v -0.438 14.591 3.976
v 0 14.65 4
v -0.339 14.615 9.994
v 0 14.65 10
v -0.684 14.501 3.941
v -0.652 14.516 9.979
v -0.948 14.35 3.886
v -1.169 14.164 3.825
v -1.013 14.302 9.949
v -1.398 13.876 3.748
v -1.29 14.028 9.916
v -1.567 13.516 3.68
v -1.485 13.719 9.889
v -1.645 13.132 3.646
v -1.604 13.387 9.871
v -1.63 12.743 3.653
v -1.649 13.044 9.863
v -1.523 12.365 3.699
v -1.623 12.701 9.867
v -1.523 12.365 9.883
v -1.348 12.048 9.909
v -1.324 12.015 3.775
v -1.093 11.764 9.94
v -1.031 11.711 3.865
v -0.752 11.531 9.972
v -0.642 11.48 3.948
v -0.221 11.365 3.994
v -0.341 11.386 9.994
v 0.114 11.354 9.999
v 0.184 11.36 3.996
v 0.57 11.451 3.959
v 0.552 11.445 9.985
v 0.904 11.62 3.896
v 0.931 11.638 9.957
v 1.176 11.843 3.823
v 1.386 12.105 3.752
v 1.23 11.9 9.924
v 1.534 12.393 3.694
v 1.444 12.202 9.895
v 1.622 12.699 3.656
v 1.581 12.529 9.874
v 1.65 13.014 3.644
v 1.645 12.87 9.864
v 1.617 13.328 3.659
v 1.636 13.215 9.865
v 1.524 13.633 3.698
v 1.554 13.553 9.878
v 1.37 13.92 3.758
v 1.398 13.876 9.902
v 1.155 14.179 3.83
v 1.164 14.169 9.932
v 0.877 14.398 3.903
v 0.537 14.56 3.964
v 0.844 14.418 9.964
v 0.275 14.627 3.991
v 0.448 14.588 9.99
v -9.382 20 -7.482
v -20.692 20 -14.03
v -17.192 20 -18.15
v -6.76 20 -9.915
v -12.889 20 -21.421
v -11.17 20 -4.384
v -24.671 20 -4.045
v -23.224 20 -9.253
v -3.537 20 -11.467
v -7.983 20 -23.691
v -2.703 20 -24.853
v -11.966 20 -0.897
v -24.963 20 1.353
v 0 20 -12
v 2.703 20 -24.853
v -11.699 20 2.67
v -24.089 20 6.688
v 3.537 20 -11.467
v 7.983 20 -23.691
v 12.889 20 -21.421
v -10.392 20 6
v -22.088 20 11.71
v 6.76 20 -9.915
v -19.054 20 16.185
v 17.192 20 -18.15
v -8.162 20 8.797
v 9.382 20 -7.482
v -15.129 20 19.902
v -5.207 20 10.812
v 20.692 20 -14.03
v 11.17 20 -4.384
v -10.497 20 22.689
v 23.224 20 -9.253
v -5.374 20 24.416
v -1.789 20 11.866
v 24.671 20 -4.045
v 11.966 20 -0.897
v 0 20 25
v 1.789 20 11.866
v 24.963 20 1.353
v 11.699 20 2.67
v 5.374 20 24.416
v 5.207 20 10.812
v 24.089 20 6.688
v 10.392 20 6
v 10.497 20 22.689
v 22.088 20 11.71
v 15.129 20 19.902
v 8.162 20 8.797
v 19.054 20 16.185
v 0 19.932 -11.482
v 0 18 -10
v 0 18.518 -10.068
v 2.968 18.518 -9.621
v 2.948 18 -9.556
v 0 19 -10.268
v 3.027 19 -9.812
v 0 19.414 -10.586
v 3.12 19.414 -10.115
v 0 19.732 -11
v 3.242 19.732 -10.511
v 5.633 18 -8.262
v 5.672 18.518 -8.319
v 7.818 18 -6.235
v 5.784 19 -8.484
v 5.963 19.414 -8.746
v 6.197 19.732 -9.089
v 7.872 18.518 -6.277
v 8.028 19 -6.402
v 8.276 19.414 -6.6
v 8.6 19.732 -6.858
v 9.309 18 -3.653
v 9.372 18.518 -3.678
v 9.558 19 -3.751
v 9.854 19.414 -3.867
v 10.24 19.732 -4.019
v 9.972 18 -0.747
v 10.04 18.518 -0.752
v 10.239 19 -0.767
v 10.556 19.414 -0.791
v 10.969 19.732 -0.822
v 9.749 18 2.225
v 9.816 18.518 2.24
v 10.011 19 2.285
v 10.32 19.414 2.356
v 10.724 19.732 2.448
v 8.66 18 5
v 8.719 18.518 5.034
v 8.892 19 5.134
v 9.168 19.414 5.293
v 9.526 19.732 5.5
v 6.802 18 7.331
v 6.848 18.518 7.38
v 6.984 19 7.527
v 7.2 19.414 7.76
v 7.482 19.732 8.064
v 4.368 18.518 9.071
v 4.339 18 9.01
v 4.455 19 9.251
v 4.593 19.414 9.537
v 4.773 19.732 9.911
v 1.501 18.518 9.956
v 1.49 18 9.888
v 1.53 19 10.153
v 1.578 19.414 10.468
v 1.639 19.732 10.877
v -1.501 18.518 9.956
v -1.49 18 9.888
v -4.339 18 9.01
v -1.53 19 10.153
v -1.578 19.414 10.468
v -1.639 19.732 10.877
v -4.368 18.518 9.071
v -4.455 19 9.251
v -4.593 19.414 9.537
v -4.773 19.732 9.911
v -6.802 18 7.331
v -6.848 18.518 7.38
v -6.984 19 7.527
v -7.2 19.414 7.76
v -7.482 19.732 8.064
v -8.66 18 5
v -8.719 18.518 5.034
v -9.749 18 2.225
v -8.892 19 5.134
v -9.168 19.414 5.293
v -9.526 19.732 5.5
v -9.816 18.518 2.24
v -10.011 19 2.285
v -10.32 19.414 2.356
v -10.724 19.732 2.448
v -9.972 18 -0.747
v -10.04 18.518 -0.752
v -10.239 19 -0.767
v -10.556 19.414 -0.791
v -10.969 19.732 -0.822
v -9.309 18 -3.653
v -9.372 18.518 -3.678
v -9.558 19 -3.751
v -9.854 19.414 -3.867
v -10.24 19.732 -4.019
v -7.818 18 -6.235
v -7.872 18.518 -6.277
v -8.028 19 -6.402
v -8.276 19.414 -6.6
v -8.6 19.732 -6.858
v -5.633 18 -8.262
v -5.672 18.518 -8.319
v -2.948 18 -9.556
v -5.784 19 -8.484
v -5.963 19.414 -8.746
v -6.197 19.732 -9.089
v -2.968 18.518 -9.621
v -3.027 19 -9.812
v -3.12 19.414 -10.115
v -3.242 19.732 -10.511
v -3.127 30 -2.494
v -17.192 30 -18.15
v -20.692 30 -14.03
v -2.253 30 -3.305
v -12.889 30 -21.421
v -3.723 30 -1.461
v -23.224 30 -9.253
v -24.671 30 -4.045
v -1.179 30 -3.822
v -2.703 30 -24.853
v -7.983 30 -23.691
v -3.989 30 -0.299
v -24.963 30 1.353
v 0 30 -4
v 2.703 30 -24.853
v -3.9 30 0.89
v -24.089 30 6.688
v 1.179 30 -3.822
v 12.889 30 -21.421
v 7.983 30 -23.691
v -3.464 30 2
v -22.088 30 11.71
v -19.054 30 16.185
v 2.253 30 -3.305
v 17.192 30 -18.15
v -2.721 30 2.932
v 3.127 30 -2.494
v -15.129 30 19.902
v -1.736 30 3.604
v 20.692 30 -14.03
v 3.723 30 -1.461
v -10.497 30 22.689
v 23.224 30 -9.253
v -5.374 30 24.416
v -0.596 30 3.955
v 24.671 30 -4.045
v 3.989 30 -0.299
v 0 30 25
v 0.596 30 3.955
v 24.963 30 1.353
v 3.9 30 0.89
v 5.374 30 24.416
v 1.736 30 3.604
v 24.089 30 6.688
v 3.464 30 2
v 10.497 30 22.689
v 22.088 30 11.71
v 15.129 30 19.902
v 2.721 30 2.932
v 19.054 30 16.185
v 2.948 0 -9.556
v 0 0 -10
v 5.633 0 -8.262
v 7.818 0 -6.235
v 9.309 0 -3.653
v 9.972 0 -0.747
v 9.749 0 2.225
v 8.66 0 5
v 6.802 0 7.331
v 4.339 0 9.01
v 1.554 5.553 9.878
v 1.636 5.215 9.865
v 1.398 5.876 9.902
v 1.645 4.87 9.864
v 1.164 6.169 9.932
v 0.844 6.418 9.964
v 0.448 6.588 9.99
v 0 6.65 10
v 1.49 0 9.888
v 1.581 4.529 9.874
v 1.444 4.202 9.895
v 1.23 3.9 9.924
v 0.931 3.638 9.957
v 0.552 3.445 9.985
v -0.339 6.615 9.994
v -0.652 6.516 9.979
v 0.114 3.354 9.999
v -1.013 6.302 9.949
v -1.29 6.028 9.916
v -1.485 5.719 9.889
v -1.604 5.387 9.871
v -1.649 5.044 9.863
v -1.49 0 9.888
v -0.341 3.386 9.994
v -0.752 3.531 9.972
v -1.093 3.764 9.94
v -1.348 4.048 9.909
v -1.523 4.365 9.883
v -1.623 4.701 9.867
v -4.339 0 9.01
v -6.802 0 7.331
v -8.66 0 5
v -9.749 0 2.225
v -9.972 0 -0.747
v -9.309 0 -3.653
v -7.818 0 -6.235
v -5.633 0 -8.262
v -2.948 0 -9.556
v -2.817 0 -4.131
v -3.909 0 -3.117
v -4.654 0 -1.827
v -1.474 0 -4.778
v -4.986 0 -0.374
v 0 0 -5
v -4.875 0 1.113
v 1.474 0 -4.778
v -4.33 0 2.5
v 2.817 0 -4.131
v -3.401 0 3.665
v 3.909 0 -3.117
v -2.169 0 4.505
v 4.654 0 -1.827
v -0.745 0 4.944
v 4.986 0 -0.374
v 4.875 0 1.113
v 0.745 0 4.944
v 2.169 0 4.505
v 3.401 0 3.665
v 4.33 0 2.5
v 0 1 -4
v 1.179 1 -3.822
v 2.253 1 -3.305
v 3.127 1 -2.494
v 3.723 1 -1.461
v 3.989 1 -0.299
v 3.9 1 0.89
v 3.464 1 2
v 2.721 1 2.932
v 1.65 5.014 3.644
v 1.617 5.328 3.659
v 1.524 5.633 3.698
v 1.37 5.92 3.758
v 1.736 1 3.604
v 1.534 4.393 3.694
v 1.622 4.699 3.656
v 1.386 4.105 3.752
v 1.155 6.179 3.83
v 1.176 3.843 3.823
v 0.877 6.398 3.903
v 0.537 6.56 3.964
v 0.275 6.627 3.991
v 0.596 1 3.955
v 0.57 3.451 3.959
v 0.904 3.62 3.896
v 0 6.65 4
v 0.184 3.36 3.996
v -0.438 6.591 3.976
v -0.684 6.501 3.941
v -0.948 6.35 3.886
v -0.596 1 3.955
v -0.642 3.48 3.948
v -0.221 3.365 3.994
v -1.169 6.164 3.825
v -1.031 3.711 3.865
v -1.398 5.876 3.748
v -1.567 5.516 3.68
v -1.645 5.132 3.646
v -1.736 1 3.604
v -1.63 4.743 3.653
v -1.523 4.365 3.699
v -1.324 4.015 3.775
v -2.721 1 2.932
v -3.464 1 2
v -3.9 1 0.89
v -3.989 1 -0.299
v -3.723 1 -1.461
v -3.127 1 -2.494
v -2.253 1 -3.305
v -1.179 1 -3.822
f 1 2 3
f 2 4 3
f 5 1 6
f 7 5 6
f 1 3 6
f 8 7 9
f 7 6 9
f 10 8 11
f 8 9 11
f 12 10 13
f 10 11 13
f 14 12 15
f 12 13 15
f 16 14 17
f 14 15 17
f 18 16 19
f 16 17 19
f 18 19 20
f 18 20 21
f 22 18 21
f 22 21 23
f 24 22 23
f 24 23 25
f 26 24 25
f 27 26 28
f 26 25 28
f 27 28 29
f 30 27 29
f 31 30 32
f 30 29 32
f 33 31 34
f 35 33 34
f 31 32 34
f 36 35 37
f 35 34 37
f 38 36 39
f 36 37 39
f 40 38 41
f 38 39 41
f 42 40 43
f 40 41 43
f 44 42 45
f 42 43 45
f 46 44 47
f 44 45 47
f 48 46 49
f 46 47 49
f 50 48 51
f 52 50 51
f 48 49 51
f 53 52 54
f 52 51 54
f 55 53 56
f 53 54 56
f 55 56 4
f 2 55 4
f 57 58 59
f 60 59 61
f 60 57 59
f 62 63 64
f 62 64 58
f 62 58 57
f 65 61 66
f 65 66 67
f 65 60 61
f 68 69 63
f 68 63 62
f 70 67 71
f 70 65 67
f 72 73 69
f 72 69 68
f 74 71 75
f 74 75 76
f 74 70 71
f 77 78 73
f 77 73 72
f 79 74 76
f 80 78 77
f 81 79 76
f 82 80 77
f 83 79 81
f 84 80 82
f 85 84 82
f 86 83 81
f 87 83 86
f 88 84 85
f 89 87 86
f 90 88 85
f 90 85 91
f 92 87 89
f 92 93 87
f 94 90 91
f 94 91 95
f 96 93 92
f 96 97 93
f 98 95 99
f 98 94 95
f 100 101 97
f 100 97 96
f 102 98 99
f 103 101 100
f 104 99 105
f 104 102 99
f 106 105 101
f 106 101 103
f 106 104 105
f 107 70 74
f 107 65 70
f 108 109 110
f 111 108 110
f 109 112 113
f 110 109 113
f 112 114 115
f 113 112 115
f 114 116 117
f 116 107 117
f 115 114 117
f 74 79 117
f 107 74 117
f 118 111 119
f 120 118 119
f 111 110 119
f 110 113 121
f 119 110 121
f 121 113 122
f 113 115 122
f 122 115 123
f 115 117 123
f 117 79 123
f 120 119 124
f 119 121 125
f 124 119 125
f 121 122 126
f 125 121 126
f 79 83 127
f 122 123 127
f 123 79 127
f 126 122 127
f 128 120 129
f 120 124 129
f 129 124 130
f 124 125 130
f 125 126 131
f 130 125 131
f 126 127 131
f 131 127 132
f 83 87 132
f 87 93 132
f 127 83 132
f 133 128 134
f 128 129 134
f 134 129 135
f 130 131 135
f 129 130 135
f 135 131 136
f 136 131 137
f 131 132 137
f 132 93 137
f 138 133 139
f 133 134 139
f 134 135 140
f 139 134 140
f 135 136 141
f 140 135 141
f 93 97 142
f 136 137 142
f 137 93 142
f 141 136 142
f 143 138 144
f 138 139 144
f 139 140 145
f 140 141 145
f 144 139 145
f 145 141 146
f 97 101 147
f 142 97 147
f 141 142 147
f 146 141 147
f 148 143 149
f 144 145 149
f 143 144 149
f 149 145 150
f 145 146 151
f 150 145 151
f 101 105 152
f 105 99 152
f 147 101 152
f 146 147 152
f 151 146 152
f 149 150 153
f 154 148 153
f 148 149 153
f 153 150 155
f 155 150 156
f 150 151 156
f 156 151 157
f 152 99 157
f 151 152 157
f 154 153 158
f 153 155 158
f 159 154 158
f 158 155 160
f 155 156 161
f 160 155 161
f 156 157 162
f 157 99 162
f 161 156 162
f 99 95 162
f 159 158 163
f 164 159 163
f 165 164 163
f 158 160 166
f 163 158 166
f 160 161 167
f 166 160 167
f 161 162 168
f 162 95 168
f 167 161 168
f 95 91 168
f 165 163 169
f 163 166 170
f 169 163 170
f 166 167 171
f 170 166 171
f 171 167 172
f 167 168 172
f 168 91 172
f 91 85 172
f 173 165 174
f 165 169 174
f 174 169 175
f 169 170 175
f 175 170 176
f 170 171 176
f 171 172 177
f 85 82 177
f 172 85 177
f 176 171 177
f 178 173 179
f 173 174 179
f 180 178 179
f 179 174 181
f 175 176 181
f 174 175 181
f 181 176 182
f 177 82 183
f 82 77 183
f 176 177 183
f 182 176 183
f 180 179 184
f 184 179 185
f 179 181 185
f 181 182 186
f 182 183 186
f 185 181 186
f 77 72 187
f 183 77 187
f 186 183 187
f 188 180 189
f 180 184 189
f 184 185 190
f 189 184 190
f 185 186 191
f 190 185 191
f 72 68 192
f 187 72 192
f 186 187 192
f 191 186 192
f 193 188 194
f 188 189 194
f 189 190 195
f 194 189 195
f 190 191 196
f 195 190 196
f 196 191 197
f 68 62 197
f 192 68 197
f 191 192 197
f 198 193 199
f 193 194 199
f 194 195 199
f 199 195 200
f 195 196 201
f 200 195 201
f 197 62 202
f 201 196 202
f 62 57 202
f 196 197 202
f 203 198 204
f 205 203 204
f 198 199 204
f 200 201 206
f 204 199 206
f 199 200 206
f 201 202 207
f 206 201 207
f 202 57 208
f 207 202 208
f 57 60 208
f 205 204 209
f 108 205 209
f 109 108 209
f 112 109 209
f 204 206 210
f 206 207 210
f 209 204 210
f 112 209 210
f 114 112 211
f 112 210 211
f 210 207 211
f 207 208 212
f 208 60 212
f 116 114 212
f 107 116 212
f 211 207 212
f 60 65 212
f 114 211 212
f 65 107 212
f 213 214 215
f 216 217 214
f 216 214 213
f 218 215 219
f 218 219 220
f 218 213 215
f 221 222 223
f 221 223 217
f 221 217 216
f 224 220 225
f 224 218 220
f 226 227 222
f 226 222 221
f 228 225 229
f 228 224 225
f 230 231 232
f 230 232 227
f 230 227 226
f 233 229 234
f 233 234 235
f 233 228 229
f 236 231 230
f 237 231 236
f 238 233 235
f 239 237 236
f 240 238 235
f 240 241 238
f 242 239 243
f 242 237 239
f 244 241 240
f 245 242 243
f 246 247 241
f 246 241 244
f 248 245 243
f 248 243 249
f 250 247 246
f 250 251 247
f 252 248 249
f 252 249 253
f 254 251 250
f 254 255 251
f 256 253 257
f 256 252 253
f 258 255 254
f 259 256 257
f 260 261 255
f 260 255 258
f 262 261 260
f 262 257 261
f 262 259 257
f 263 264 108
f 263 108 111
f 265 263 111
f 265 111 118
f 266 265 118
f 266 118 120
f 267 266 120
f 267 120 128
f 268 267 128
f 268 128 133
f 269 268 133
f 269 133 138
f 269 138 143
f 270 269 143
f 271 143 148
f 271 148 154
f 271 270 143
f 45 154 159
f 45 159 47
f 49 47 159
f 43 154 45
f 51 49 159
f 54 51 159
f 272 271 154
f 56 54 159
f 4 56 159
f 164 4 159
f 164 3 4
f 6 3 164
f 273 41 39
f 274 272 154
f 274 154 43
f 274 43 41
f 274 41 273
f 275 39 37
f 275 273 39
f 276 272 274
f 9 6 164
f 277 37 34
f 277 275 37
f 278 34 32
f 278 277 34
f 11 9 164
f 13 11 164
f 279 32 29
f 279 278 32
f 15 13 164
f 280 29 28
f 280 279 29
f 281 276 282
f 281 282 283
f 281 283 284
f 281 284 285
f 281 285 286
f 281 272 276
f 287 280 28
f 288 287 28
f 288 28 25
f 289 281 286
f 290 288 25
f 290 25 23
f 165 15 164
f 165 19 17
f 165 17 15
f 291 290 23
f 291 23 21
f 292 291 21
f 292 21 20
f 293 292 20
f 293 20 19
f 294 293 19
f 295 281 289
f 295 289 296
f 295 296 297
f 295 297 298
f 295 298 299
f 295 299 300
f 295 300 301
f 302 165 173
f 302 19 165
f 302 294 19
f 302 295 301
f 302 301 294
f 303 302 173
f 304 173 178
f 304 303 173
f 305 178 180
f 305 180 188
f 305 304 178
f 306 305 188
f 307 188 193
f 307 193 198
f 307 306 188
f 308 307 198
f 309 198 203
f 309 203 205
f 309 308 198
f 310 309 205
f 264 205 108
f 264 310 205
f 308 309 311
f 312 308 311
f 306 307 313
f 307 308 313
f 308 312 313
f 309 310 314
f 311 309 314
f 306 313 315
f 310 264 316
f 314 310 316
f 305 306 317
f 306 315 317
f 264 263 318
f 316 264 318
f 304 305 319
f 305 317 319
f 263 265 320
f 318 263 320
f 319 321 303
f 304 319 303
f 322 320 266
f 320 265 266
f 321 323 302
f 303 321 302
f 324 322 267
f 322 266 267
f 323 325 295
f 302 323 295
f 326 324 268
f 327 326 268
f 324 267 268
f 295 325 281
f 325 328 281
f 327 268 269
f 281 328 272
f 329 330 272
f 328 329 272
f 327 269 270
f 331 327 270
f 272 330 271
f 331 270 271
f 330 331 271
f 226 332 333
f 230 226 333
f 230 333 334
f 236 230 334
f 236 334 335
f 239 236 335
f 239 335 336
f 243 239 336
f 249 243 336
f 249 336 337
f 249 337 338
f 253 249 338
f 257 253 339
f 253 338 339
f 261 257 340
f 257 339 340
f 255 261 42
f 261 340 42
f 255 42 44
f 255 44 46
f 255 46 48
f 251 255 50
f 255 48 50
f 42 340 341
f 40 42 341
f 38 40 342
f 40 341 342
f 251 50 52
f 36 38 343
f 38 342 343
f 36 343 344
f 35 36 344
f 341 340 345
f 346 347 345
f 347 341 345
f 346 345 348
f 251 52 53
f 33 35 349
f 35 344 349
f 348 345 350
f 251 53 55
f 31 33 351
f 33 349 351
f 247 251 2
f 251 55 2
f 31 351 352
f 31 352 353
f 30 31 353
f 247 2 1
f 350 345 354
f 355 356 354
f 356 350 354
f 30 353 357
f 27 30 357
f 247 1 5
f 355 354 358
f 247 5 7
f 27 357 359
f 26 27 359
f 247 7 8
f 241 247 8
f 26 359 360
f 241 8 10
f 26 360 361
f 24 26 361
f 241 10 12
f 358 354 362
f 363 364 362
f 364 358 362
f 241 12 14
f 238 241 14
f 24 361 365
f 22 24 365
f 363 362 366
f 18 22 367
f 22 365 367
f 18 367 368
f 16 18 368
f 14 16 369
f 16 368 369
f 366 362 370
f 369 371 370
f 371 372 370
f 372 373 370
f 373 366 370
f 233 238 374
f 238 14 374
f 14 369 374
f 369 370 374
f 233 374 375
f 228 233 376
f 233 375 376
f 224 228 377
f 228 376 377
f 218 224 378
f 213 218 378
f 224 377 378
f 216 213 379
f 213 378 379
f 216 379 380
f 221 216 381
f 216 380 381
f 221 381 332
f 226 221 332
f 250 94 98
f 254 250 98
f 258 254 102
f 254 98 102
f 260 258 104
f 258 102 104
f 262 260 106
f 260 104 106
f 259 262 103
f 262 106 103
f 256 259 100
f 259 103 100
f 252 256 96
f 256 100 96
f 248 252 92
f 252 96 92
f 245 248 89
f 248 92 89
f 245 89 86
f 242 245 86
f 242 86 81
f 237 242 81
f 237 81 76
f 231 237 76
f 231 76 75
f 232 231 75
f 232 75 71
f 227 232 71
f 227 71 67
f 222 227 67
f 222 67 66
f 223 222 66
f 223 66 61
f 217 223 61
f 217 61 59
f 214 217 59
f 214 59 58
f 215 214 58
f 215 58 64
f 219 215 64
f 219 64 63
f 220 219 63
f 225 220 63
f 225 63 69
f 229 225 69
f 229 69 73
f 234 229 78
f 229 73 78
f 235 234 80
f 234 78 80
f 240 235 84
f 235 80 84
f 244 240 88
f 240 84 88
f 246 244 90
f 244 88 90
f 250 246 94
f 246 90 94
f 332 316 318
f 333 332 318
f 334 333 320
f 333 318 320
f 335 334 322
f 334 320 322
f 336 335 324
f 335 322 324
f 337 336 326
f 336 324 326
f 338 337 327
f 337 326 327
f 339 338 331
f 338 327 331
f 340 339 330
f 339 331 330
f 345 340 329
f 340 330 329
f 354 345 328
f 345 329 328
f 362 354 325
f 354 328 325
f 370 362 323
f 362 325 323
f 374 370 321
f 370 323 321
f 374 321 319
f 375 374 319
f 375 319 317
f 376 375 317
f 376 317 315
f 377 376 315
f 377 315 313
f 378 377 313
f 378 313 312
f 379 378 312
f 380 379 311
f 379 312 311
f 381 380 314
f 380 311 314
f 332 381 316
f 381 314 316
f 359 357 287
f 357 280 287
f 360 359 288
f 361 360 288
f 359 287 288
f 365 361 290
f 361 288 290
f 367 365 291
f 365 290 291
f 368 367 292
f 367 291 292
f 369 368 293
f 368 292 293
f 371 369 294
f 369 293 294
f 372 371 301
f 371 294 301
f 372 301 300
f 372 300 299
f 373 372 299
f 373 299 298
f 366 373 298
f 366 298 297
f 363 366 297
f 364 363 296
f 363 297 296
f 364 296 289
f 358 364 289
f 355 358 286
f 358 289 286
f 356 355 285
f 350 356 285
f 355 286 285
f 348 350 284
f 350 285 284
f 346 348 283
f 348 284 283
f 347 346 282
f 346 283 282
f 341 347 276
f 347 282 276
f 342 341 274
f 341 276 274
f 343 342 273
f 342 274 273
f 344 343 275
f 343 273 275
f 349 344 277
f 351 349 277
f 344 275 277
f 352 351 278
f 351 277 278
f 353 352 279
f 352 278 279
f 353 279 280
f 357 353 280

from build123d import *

# Parameters (mm, degrees)
SKETCH1_R                  = 25
BOSS_EXTRUDE1_DEPTH        = 30
CUT_EXTRUDE1_REACH         = 48.368
SKETCH2_R                  = 4
SKETCH3_OUTSIDE_W          = 67.362
SKETCH3_OUTSIDE_H          = 67.362
SKETCH3_OUTSIDE_R          = 10
CUT_EXTRUDE2_DEPTH         = 20
SKETCH4_W                  = 1.65
SKETCH4_H                  = 10
M4_TAPPED_HOLE1_AT_2_COUNT = 2
M4_TAPPED_HOLE1_AT_2_PITCH = 8
CHAMFER1_SIZE              = 1
FILLET1_R                  = 2


with BuildPart() as part:
    # Sketch1 → Boss-Extrude1 (new body)
    with BuildSketch(Plane(origin=(0, 0, 0), x_dir=(1, 0, 0), z_dir=(0, 1, 0))):
        with Locations(Location((0, 0, 0), (0, 0, 270))):
            Circle(SKETCH1_R)
    extrude(amount=BOSS_EXTRUDE1_DEPTH)

    # Sketch2 → Cut-Extrude1 (cut, up to next)
    with BuildSketch(Plane.XZ, mode=Mode.PRIVATE) as cut_extrude1_sk1:
        with Locations(Location((0, 0, 0), (0, 0, 270))):
            Circle(SKETCH2_R)
    cut_extrude1_tool1 = extrude(cut_extrude1_sk1.sketch, amount=-CUT_EXTRUDE1_REACH, mode=Mode.PRIVATE) & part.part
    add(cut_extrude1_tool1.solids().sort_by_distance((0, 0, 0))[0], mode=Mode.SUBTRACT)

    # Sketch3 outside → Cut-Extrude2 (cut)
    with BuildSketch(Plane.XZ):
        Rectangle(SKETCH3_OUTSIDE_W, SKETCH3_OUTSIDE_H)
        with Locations(Location((0, 0, 0), (0, 0, 270))):
            Circle(SKETCH3_OUTSIDE_R, mode=Mode.SUBTRACT)
    extrude(amount=-CUT_EXTRUDE2_DEPTH, mode=Mode.SUBTRACT)

    # Sketch4 → M4 Tapped Hole1 (revolve, cut)
    with BuildSketch(Plane(origin=(0, 5, 0), x_dir=(0, 1, 0), z_dir=(1, 0, 0))):
        with Locations((0.825, 5)):
            Rectangle(SKETCH4_W, SKETCH4_H)
    m4_tapped_hole1 = revolve(axis=Axis((0, 5, -6.35), (0, 0, 1)), mode=Mode.SUBTRACT)

    # M4 Tapped Hole1 at 2: M4 Tapped Hole1 ×2
    with Locations(*[(0, i * M4_TAPPED_HOLE1_AT_2_PITCH, 0) for i in range(1, M4_TAPPED_HOLE1_AT_2_COUNT)]):
        add(m4_tapped_hole1, mode=Mode.SUBTRACT)

    # Chamfer1
    chamfer1_edges = [part.edges().sort_by_distance(p)[0] for p in [
        (0, 0, 4),
    ]]
    chamfer(chamfer1_edges, length=CHAMFER1_SIZE)

    # Fillet1
    fillet1_edges = [part.edges().sort_by_distance(p)[0] for p in [
        (0, 20, 10),
    ]]
    fillet(fillet1_edges, radius=FILLET1_R)


solid = part.part
